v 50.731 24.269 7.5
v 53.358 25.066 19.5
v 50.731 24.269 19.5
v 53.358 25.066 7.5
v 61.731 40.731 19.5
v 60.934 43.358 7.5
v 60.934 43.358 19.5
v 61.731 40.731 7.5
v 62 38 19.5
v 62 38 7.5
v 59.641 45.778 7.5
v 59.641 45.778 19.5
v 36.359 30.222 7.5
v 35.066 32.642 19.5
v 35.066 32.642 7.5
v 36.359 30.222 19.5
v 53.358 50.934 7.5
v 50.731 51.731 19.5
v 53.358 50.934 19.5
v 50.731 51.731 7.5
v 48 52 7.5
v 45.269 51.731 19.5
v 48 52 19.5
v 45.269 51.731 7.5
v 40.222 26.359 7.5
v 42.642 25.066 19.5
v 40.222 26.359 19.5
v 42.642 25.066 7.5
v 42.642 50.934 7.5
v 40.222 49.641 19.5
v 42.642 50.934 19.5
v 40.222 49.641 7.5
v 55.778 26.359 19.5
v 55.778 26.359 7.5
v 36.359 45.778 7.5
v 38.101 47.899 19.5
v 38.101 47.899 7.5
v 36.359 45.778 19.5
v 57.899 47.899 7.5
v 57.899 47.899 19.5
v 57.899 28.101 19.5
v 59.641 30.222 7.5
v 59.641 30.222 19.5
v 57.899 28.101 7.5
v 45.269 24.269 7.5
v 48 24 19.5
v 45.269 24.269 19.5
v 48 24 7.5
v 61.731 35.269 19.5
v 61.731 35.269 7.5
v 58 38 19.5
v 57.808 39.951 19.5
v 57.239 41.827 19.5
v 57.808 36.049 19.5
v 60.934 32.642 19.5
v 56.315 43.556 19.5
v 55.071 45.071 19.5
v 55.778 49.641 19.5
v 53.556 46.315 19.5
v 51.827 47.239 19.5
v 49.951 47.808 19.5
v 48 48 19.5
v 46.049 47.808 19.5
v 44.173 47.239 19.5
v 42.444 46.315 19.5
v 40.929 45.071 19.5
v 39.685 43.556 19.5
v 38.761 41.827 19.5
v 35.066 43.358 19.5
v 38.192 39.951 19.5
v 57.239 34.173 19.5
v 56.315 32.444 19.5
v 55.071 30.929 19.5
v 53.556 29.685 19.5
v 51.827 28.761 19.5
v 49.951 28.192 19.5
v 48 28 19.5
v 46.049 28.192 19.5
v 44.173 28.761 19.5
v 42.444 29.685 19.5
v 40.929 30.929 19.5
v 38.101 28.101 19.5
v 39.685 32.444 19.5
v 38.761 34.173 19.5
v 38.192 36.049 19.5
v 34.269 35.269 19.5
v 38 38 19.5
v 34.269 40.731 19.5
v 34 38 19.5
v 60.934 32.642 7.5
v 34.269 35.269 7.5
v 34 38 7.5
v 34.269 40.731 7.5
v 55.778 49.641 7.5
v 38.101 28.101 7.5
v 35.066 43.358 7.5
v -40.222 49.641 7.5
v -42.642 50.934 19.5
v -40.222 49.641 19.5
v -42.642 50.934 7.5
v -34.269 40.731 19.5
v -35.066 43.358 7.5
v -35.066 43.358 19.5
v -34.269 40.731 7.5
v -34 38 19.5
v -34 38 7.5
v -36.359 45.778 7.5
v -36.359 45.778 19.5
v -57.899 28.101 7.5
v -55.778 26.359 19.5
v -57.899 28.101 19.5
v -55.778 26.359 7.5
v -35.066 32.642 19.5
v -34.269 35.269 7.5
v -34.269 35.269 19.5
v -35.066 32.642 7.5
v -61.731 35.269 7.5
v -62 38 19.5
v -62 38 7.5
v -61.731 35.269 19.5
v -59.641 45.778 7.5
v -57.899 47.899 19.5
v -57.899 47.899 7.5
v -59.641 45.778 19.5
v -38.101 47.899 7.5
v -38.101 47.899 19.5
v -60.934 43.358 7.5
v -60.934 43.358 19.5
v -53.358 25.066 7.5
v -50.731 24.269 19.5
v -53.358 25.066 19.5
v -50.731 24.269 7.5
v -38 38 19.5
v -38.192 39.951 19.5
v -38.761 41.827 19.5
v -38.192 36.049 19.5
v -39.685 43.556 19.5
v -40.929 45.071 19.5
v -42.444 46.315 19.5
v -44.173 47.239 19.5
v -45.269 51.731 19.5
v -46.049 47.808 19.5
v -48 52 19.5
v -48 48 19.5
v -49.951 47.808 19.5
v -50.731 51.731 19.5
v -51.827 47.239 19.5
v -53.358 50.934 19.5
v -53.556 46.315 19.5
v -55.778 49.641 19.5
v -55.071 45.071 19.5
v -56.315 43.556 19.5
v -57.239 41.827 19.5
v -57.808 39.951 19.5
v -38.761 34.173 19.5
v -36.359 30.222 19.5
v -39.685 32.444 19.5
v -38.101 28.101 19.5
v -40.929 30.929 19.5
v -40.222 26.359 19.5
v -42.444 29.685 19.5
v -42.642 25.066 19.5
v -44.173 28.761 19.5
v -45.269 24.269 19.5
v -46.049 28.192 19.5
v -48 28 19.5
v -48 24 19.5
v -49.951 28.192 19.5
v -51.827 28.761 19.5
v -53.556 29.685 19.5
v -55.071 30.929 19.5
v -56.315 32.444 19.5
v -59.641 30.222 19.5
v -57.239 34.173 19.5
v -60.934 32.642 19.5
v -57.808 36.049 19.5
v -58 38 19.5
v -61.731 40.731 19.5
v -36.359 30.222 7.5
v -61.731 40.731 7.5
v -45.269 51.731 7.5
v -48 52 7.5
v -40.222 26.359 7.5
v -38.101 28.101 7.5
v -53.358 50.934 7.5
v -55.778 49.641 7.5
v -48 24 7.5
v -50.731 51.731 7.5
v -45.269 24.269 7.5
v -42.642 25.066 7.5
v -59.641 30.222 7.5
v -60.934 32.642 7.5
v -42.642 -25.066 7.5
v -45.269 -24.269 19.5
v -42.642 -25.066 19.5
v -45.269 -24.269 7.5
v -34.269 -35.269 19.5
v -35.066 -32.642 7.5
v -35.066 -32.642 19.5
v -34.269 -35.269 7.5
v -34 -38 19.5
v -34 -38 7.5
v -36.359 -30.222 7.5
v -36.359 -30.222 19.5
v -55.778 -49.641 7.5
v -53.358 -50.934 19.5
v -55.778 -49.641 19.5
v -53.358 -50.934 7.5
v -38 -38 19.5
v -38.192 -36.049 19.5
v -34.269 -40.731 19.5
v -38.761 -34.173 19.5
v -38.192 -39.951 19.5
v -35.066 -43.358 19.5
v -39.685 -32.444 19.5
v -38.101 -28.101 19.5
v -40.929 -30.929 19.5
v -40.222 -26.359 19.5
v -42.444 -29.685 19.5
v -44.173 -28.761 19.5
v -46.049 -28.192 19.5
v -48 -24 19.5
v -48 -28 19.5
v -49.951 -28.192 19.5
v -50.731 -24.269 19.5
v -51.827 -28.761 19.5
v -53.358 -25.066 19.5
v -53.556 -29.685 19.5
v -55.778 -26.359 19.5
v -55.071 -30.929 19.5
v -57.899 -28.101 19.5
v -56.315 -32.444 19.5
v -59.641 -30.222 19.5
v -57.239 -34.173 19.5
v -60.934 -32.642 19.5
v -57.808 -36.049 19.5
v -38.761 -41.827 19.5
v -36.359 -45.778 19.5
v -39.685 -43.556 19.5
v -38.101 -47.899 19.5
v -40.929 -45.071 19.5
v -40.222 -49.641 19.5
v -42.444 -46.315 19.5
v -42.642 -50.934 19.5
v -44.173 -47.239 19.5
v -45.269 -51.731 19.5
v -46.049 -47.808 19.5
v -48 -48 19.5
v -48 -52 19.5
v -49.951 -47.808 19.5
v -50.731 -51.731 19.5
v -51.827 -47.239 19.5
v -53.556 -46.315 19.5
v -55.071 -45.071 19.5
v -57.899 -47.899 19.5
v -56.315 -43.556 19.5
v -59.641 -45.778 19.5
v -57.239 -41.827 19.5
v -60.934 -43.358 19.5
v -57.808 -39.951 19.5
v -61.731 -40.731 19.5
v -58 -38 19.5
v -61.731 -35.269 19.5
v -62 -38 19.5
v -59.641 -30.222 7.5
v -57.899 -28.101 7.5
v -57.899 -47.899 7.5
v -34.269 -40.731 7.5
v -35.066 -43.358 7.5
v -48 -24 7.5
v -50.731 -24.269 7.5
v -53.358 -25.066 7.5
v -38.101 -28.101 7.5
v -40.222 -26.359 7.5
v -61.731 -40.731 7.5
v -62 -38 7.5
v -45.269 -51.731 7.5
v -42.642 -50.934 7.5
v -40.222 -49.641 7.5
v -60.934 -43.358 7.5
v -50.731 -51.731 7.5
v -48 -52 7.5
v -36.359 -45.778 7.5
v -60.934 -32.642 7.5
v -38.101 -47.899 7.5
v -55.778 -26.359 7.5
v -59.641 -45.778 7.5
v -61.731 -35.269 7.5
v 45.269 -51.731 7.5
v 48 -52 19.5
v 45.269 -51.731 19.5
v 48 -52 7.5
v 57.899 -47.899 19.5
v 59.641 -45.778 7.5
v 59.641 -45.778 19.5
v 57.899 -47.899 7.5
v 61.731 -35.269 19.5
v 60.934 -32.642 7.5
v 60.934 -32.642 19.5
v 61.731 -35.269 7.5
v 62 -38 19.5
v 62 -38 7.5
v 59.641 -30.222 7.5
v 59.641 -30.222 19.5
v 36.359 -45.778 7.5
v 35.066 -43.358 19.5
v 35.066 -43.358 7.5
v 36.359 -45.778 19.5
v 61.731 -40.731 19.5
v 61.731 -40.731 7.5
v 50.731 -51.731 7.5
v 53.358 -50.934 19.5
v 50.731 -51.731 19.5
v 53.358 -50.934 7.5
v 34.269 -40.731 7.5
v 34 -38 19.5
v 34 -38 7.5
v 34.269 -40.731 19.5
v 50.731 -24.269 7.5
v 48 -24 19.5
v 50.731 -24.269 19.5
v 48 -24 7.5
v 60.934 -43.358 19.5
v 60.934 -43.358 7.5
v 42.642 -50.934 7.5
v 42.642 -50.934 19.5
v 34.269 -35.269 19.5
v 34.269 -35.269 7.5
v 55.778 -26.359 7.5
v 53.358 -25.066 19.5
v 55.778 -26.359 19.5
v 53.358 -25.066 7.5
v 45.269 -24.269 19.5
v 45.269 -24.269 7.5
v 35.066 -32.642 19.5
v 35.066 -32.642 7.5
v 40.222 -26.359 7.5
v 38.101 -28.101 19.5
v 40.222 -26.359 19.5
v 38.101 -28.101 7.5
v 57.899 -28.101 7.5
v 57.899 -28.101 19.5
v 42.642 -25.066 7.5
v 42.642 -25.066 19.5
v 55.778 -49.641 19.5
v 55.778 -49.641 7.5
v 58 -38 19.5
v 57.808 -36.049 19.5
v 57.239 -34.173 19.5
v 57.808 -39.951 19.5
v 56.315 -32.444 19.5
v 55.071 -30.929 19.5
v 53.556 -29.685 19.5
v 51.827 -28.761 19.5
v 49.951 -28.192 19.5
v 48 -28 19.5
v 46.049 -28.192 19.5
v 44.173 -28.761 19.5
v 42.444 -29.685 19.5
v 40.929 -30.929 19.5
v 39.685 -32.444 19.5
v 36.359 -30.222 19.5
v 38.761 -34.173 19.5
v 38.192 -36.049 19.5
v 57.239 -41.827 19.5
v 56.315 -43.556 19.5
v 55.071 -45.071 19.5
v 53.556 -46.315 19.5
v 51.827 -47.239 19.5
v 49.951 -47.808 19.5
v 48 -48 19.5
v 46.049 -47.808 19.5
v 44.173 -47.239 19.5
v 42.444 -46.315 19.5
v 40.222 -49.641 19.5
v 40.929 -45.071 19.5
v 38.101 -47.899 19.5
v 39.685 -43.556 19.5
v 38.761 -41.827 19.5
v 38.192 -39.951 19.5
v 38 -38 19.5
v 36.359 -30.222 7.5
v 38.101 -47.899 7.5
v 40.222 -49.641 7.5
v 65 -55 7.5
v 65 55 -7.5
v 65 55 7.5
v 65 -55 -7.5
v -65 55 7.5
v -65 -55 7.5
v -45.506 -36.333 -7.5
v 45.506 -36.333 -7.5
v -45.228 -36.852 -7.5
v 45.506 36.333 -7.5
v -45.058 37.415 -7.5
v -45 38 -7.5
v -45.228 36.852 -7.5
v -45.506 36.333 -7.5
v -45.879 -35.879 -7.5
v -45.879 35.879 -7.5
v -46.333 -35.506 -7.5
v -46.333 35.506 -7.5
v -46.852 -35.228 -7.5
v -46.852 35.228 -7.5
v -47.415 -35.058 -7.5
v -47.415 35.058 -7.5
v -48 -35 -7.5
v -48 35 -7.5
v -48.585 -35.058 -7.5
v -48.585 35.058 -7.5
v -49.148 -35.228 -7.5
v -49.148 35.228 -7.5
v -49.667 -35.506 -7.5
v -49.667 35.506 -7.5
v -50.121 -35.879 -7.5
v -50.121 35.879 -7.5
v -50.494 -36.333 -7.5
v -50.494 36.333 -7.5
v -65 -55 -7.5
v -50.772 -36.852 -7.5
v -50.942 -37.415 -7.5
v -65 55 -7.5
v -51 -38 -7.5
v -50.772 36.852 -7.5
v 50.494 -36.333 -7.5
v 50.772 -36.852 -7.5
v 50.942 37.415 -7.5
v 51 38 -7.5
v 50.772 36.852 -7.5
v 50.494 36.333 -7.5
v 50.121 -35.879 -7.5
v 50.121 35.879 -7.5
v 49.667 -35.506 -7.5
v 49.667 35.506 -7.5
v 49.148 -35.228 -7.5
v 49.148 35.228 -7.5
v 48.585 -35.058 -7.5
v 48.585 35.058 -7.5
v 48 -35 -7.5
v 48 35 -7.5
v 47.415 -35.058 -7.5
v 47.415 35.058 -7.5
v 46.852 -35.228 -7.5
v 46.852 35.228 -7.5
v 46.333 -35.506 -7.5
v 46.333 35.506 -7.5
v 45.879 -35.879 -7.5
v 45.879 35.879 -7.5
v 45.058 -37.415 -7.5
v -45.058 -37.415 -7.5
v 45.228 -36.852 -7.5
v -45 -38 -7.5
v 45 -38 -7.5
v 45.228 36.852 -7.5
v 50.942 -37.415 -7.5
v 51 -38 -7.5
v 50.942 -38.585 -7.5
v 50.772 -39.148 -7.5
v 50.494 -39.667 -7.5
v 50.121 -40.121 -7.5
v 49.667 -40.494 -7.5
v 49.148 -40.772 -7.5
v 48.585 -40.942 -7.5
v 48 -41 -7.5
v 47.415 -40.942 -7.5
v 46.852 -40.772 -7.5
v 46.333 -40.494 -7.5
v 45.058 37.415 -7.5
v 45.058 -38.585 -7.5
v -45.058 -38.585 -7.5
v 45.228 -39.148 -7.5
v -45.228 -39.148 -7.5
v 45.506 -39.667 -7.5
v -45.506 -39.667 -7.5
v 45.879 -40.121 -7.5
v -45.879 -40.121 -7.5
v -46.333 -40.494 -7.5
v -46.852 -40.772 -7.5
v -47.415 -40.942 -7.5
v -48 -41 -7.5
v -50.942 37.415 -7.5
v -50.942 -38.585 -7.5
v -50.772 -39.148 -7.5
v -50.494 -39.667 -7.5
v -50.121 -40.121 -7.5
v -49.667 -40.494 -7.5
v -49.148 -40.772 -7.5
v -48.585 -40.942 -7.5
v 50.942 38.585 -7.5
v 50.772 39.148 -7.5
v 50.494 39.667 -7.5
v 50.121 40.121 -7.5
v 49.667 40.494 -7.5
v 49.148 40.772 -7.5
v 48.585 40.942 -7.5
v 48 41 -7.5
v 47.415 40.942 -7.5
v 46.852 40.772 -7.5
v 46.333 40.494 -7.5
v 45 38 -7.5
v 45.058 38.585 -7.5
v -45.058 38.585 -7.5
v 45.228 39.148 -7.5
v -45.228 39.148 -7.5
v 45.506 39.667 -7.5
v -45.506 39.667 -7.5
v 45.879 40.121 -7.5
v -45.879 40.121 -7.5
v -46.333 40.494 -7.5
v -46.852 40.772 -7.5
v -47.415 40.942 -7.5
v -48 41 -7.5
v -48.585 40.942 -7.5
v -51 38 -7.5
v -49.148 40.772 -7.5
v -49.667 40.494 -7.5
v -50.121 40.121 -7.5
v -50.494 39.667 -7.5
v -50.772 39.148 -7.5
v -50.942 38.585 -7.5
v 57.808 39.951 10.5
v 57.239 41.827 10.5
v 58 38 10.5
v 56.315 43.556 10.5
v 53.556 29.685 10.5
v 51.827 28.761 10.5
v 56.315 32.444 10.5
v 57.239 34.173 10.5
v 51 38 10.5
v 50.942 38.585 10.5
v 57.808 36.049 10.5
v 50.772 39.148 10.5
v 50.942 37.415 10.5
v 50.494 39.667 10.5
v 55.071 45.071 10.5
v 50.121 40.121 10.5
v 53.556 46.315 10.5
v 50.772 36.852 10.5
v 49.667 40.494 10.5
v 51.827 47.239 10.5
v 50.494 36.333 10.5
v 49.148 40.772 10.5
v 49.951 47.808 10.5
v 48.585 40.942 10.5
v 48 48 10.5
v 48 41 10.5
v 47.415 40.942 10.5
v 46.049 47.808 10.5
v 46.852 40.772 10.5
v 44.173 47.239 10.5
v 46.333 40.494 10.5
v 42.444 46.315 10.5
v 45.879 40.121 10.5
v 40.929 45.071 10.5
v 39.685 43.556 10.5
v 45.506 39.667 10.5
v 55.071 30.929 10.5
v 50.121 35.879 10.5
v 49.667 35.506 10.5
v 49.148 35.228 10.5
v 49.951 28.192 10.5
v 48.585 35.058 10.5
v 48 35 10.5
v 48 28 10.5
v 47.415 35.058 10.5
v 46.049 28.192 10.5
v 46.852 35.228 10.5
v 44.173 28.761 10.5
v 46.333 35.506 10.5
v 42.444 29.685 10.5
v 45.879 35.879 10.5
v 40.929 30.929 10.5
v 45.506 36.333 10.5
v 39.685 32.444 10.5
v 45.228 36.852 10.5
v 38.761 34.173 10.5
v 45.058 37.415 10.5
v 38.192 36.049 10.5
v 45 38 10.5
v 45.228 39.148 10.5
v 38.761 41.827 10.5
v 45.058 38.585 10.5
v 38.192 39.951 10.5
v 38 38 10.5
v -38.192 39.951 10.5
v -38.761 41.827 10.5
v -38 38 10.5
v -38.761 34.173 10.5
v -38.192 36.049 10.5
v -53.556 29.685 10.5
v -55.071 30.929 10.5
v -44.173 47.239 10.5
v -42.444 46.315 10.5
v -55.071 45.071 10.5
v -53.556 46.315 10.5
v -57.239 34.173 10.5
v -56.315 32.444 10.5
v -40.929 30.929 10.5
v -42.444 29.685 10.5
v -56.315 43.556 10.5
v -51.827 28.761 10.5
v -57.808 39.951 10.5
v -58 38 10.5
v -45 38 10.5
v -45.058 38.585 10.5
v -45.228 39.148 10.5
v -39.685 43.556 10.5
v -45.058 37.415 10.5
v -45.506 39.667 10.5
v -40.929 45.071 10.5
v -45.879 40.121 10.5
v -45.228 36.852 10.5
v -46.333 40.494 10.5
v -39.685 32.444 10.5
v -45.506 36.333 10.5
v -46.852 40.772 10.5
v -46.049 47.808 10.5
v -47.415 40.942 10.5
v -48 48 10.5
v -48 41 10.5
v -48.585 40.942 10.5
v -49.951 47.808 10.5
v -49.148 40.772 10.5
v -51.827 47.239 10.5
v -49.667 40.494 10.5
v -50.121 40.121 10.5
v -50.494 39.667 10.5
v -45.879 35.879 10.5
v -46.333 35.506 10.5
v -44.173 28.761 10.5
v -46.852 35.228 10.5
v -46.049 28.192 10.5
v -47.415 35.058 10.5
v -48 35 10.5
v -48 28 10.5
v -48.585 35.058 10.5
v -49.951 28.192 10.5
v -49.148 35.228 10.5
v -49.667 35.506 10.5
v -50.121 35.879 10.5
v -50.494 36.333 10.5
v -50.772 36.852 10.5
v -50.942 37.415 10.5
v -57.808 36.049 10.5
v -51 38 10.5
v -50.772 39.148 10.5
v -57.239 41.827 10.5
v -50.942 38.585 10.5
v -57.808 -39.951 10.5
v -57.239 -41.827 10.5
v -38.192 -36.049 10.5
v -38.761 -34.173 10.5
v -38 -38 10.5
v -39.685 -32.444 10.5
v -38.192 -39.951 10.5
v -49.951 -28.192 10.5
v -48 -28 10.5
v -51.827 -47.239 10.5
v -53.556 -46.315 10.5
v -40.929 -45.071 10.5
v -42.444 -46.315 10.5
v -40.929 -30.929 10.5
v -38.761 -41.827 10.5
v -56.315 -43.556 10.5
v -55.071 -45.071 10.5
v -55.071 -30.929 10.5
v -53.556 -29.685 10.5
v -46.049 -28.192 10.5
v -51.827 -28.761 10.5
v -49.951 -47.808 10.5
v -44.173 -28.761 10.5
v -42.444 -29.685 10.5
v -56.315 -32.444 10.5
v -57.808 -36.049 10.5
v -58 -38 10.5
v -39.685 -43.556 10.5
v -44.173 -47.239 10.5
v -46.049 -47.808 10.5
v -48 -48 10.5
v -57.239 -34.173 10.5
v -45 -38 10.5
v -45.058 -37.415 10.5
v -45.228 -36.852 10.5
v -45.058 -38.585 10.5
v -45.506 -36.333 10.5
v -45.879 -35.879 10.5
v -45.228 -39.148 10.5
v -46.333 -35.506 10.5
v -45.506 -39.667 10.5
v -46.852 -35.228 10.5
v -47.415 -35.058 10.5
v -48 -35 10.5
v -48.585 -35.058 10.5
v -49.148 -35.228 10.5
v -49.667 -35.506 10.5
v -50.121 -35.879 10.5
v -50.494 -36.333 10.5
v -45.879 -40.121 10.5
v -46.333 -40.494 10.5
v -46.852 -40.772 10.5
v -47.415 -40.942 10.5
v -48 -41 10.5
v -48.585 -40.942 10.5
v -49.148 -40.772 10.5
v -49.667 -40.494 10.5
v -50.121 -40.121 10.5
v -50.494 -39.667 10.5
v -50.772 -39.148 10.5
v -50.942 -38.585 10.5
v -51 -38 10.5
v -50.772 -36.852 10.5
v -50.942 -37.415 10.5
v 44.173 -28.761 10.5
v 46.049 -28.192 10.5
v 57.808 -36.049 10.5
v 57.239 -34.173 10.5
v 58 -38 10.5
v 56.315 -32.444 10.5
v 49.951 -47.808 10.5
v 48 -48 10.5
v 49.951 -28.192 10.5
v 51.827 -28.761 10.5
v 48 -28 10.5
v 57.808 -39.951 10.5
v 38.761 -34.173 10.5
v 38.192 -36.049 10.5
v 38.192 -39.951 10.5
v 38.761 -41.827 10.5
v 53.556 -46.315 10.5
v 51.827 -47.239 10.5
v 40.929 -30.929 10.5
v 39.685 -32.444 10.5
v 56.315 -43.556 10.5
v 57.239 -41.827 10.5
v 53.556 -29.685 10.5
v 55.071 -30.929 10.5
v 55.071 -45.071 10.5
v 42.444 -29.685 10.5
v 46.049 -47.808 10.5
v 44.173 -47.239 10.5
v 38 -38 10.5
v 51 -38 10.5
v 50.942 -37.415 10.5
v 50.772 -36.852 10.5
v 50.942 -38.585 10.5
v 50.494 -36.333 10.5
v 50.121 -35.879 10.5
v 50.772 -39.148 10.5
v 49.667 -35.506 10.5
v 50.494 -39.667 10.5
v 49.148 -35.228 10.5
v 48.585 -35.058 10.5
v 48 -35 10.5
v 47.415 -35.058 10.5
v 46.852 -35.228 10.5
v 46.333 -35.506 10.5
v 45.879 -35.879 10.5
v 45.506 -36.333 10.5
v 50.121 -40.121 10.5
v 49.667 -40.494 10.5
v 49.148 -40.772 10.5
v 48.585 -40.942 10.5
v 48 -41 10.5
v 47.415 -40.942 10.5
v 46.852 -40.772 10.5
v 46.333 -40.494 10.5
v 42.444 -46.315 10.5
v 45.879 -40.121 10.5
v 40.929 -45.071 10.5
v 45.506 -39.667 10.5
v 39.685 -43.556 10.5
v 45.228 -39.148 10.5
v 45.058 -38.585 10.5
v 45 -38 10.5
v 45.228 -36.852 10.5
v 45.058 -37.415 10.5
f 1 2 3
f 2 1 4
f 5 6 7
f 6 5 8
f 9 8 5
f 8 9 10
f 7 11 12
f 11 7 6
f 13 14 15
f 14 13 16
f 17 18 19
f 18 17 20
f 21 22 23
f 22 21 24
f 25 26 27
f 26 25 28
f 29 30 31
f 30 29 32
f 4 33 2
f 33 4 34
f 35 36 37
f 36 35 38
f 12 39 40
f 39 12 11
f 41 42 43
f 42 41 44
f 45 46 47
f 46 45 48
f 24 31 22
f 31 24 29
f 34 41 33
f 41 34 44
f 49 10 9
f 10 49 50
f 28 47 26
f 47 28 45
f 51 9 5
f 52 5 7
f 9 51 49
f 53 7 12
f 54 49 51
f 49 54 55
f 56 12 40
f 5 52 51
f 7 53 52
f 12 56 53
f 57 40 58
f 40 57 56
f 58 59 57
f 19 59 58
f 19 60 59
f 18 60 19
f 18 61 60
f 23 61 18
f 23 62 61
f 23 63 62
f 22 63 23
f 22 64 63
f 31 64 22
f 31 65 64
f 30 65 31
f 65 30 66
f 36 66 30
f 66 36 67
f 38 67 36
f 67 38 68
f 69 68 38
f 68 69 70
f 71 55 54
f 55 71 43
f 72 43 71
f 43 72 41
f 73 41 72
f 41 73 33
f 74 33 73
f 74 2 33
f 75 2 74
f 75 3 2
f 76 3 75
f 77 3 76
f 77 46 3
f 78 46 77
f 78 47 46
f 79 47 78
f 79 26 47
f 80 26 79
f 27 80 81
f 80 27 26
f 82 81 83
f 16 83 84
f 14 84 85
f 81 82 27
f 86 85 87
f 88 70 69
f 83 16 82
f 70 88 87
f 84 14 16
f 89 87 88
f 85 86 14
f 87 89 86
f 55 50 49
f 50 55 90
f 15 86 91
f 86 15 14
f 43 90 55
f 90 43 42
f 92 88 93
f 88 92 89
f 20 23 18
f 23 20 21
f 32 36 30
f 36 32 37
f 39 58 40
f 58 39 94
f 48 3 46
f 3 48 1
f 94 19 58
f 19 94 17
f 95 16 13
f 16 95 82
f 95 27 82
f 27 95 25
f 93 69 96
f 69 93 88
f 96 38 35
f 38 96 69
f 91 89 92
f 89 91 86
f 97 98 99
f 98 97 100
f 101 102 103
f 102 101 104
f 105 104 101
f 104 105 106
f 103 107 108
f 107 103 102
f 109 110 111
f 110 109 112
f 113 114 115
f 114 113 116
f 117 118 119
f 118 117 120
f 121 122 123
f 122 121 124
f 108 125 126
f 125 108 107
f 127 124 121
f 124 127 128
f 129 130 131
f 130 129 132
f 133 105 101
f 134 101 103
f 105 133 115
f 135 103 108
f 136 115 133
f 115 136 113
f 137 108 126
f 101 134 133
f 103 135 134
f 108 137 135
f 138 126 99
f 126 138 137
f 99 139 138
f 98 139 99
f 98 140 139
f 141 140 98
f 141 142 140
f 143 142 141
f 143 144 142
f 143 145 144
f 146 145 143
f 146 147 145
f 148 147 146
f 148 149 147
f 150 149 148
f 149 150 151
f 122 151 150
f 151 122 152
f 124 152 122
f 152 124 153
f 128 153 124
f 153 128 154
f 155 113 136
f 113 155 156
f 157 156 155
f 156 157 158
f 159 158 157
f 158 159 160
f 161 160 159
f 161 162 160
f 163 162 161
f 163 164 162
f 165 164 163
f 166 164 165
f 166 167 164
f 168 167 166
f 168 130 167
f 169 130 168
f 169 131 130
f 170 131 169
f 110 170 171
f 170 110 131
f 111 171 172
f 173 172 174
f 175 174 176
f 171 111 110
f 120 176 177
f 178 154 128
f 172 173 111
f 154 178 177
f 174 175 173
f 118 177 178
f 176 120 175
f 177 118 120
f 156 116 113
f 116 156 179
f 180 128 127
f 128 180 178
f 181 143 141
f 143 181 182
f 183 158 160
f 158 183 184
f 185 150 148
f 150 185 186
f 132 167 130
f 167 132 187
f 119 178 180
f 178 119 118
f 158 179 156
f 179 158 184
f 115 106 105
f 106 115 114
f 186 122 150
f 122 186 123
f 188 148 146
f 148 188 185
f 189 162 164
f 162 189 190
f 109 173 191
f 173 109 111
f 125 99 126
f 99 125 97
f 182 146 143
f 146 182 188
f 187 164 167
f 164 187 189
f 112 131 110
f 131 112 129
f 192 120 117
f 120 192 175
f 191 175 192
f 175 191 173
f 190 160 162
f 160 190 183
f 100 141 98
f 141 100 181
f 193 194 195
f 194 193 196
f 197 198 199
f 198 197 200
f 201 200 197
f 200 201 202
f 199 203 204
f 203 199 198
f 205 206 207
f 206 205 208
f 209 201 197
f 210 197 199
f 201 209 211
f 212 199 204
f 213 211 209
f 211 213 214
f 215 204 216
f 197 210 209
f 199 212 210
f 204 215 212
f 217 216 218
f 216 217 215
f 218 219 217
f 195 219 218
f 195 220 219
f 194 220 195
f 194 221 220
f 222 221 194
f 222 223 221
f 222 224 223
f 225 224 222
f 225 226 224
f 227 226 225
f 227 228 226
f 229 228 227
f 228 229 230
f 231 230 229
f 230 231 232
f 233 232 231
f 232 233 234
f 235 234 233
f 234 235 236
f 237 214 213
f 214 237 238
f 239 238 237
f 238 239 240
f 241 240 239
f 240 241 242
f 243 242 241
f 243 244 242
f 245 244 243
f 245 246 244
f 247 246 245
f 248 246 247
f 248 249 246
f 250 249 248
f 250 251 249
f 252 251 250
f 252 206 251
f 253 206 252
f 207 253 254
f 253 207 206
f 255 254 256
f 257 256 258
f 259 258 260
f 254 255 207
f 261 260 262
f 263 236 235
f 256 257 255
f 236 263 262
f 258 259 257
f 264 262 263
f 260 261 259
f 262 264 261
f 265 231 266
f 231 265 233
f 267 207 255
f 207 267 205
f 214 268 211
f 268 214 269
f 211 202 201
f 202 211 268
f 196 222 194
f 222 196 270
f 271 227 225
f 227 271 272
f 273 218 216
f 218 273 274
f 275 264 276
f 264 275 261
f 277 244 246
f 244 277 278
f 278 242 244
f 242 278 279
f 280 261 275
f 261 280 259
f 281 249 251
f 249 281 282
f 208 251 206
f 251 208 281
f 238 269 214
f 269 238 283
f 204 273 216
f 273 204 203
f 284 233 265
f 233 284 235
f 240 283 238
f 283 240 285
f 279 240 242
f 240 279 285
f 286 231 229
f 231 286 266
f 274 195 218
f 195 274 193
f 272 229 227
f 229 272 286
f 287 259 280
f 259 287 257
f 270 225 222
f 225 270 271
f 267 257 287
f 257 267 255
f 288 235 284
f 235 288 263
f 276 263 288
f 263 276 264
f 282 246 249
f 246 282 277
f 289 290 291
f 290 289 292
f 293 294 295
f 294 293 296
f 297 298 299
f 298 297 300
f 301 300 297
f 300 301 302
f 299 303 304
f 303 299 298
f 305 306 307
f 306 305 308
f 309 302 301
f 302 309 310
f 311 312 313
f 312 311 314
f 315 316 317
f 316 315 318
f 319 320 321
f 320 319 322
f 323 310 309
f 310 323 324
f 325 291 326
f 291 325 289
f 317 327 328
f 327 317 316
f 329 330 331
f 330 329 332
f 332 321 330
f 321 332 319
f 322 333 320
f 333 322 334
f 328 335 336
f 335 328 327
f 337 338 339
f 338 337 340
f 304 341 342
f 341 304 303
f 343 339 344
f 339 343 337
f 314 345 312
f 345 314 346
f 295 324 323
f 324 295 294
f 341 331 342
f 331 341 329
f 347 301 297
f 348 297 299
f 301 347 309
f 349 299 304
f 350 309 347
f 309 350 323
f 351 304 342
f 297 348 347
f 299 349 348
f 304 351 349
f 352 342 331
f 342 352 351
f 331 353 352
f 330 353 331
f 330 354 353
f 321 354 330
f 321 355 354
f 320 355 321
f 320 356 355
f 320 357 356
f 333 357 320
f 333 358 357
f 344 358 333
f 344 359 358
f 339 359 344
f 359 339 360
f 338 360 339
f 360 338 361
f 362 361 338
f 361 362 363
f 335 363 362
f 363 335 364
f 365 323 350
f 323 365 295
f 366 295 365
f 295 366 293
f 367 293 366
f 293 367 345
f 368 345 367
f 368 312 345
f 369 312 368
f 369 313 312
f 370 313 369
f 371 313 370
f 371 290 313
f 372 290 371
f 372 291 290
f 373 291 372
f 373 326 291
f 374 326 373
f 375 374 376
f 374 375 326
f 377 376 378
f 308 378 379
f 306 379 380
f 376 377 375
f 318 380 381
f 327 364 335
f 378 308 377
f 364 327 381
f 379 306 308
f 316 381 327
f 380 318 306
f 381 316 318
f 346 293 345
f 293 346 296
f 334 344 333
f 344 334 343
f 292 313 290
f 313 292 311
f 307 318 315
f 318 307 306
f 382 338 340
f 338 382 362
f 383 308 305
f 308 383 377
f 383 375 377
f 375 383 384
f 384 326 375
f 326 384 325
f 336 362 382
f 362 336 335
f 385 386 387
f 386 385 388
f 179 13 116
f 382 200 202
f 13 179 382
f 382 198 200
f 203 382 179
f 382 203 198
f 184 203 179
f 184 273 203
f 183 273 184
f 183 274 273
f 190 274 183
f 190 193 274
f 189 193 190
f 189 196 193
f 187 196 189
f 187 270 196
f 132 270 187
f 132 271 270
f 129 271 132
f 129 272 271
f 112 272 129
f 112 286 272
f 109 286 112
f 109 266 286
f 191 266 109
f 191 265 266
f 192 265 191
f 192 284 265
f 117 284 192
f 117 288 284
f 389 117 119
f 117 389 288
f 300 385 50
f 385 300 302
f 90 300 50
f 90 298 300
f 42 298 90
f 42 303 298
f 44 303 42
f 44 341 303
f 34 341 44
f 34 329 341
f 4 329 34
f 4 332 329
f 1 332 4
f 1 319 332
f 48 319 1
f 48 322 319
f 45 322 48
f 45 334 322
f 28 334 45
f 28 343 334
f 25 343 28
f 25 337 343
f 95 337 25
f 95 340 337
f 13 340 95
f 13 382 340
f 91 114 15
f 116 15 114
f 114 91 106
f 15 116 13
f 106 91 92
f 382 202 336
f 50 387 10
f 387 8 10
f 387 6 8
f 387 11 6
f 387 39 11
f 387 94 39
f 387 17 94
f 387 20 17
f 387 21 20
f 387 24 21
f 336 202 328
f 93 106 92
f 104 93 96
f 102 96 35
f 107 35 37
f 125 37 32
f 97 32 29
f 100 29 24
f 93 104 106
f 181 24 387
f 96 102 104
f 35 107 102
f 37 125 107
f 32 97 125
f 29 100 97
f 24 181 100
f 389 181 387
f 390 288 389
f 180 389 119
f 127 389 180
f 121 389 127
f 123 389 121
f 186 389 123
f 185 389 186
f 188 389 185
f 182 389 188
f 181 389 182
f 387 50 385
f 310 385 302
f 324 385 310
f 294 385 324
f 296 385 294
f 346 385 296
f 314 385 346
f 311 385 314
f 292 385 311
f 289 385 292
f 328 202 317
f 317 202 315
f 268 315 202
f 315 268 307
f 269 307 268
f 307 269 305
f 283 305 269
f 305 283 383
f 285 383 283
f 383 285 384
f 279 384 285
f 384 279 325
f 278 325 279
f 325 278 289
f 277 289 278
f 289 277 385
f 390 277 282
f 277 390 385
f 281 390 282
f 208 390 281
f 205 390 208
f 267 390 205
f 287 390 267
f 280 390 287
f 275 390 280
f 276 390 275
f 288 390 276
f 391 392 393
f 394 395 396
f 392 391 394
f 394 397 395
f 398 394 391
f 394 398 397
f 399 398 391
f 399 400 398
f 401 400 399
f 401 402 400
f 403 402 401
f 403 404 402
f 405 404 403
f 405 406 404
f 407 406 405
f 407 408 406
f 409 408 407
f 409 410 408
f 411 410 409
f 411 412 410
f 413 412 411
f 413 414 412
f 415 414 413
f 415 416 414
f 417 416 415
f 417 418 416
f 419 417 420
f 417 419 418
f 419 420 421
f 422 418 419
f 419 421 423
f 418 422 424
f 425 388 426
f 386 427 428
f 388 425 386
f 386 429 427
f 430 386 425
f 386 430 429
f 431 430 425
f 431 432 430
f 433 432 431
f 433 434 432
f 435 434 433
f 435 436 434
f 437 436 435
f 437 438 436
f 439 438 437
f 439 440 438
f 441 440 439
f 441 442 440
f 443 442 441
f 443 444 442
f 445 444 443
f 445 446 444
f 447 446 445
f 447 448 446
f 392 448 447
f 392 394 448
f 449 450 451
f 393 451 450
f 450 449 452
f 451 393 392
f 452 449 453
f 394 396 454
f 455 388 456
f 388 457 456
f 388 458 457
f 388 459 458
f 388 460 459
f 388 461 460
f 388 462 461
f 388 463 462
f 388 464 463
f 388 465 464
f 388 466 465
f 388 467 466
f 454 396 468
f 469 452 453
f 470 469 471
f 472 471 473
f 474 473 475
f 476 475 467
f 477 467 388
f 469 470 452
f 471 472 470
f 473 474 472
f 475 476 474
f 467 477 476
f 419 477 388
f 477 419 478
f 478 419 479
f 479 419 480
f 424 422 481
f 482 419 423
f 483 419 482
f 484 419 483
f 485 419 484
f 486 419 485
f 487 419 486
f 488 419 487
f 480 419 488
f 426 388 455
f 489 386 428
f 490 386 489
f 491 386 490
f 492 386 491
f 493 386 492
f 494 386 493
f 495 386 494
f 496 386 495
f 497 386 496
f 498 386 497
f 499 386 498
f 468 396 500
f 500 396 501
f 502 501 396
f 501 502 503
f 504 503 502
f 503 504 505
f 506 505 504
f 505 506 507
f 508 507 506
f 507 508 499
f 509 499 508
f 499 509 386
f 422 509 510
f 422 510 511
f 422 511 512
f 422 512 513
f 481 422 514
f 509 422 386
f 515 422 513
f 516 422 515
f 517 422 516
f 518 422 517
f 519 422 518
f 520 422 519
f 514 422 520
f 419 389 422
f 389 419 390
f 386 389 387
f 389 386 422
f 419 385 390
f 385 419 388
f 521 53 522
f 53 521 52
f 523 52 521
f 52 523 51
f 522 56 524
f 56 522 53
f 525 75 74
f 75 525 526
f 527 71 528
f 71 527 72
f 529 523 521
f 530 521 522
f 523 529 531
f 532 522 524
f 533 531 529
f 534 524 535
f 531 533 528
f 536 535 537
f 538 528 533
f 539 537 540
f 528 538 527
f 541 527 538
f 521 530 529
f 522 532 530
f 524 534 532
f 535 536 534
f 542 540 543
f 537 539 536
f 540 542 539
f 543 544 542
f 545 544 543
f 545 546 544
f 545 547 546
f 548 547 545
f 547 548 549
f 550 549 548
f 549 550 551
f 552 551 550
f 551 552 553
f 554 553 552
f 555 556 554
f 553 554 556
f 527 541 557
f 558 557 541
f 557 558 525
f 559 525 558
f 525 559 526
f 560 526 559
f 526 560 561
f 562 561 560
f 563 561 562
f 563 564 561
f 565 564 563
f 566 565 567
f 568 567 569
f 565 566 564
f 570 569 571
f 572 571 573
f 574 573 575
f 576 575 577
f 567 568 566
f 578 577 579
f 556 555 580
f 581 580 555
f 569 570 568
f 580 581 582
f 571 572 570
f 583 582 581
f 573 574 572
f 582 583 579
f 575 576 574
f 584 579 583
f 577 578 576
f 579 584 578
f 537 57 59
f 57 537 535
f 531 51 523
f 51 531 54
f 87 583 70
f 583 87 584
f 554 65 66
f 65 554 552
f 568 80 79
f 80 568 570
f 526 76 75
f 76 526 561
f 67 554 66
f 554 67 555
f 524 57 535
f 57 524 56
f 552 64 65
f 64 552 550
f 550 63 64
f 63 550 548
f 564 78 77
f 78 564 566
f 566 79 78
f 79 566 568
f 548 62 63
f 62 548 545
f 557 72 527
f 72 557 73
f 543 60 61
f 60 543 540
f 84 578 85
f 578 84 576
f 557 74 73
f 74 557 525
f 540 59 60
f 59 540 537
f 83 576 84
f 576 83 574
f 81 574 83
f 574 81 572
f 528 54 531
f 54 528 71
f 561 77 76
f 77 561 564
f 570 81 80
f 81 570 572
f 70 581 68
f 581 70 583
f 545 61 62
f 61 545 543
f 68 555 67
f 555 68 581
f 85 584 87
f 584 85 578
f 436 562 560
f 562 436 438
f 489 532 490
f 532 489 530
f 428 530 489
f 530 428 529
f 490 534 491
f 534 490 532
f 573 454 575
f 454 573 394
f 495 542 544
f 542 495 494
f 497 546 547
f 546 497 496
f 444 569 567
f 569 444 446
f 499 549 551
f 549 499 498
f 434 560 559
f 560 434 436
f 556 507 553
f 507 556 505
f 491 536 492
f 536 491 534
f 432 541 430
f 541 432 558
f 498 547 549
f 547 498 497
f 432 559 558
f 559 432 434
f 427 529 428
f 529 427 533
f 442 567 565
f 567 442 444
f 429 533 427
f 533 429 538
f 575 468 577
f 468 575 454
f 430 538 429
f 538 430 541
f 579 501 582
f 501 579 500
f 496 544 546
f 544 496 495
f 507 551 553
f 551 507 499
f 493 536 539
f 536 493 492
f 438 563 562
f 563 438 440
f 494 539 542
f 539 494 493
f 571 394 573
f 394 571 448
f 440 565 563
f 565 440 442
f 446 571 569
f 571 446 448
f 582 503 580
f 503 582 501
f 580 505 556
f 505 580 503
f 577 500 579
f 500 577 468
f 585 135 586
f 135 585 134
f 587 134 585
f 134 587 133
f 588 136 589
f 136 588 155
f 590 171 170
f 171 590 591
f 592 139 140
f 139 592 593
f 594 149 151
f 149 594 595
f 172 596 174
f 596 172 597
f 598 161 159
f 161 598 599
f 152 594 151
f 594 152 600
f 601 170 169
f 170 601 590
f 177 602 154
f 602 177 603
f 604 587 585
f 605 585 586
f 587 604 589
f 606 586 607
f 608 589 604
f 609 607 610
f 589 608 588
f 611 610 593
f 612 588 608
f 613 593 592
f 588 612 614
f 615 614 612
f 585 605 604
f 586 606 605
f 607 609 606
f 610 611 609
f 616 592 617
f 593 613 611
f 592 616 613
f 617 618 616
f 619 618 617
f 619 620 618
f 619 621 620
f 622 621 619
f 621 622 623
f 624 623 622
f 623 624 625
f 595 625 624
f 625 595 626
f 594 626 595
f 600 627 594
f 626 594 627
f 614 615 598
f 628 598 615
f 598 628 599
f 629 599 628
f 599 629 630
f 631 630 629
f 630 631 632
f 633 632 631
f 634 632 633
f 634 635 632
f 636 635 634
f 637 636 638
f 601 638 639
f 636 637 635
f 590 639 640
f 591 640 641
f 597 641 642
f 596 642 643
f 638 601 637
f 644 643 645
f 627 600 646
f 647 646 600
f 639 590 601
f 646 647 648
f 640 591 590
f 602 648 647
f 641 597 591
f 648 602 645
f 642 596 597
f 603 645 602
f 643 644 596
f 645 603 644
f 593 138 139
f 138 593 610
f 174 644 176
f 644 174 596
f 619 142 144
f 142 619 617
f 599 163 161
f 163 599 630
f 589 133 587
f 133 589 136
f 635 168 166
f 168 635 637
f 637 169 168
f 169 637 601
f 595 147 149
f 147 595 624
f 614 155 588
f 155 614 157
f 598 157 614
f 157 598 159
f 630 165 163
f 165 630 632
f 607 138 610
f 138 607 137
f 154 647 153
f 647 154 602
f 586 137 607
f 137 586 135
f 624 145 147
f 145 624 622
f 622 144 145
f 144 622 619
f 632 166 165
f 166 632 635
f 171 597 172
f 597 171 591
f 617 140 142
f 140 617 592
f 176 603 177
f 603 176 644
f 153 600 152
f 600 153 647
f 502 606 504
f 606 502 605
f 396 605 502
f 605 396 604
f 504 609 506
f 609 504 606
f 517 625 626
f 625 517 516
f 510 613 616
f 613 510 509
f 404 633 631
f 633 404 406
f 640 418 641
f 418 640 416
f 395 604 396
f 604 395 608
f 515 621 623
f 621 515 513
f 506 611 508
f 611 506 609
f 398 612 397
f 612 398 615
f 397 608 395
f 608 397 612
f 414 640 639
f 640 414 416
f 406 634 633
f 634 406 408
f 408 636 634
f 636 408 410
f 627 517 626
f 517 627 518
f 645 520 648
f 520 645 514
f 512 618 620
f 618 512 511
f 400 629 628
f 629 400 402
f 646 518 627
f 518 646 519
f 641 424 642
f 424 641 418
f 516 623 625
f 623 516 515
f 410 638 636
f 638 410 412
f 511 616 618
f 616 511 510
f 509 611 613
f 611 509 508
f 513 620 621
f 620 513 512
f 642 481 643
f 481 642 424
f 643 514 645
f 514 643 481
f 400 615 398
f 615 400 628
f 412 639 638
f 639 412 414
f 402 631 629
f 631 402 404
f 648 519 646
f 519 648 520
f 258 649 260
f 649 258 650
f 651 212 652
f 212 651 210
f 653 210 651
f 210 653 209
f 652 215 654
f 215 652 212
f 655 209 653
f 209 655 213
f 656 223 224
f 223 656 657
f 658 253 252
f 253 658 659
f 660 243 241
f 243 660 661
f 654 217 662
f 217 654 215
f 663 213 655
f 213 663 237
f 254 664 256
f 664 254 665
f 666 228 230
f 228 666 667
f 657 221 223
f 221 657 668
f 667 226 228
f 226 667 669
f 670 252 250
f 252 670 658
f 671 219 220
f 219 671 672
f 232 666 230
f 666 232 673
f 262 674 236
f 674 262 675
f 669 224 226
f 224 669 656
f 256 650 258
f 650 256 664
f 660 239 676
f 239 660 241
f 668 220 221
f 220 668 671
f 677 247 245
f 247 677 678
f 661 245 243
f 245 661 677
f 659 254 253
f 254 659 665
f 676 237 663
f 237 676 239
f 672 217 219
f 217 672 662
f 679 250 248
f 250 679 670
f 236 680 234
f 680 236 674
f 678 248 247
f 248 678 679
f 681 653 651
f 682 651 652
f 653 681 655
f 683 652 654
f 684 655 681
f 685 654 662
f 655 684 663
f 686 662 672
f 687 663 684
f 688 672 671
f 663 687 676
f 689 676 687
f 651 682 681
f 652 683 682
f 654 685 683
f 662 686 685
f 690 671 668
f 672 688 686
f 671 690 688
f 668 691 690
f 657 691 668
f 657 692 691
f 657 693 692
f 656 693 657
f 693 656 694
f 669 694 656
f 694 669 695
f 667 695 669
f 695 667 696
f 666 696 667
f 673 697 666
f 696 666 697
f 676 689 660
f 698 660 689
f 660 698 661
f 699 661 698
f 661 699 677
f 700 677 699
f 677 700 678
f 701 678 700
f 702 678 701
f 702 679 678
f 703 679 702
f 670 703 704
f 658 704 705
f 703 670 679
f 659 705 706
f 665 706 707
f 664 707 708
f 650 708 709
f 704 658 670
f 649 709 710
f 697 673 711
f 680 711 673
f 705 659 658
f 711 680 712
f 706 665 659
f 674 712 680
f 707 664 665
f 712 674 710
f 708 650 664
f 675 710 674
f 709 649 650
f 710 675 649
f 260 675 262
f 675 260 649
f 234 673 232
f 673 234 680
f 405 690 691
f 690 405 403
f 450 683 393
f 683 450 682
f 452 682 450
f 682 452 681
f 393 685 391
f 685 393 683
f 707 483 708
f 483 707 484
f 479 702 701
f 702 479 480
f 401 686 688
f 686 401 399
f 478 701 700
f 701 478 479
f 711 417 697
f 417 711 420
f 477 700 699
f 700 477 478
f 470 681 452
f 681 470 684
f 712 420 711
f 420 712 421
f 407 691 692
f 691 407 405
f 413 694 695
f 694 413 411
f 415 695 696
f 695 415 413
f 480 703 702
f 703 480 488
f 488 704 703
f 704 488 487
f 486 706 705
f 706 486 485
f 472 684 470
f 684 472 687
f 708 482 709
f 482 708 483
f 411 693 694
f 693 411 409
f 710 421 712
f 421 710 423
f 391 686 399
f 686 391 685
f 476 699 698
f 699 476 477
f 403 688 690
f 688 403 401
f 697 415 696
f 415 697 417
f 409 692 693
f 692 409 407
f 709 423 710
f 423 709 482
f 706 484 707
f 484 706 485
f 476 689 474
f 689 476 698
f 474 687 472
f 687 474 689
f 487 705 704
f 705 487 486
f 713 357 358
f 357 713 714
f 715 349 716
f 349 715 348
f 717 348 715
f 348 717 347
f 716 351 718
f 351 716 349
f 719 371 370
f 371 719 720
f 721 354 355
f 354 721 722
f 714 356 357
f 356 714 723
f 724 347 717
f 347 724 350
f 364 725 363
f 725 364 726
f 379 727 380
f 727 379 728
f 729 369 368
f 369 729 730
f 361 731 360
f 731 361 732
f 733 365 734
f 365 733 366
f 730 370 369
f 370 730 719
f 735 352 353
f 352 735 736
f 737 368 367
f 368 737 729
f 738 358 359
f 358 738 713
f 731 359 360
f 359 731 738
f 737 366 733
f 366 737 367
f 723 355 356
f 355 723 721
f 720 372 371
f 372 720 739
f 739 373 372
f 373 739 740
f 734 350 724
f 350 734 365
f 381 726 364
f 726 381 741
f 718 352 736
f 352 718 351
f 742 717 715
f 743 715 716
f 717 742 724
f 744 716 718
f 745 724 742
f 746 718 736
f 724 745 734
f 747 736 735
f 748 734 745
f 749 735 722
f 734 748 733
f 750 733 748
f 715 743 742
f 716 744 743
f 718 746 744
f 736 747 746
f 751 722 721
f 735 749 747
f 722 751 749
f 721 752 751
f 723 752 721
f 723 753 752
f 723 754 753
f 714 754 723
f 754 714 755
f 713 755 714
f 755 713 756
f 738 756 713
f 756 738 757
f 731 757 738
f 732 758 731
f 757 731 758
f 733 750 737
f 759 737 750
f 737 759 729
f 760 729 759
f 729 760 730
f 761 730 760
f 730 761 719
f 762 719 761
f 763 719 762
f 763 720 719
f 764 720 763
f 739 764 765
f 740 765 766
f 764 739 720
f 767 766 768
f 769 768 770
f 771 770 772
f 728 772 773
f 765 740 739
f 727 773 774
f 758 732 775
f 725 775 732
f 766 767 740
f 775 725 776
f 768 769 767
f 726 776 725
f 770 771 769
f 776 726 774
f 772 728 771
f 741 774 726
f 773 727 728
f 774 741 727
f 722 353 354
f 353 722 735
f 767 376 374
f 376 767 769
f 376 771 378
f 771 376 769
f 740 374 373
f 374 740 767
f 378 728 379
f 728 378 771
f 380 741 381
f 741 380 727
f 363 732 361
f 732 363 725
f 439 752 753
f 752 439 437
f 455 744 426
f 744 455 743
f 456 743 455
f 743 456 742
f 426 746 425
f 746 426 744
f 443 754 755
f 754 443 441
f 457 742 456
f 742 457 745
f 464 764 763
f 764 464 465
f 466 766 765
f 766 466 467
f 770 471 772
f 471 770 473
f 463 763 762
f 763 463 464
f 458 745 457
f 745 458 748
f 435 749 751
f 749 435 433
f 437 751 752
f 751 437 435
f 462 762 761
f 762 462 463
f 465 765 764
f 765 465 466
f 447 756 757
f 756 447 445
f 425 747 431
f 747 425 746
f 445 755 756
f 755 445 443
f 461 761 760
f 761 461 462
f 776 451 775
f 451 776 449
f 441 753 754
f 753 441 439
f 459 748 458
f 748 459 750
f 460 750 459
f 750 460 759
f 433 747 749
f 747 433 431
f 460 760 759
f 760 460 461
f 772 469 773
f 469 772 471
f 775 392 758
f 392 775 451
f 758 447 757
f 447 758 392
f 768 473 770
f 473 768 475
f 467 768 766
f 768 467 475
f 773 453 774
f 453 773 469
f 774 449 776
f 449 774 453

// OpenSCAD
$fn = 32;

// ----------------------------------------------------------------------
// Socket pad plate
// bosses with counterbored sockets for the screws
// ----------------------------------------------------------------------

// --- parameters (mm) ---
base_t = 15;             // base plate thickness
boss_h = 12;             // boss height above the base plate
boss_d = 28;             // boss diameter
socket_d = 20;           // socket diameter
socket_depth = 9;        // socket depth from the boss face
bolt_d = 6;              // screw clearance hole through the socket floor
plate = [130, 110, 15];  // overall size (x, y, z)
edge = 17;               // boss centre offset from the plate edge
pads = 4;                // boss count, one per corner

// --- derived feature positions (mm) ---
height = base_t + boss_h;        // = 27   overall height of the part
corner_x = plate[0] / 2 - edge;  // = 48   boss centre X
corner_y = plate[1] / 2 - edge;  // = 38   boss centre Y
feature_centers = [
  [corner_x, corner_y],
  [-corner_x, corner_y],
  [-corner_x, -corner_y],
  [corner_x, -corner_y]
];   // boss centres: sockets, holes and the pads themselves are placed from here

// base plate, bosses on feature_centers, socket + through hole in each
difference() {
  union() {
    cube(plate, center = true);
    for (centre = feature_centers)
      translate([centre[0], centre[1], plate[2] / 2 - 1])
        cylinder(d = boss_d, h = boss_h + 1);
  }
  for (centre = feature_centers) {
    translate([centre[0], centre[1], plate[2] / 2 + boss_h - socket_depth])
      cylinder(d = socket_d, h = socket_depth + 1);
    translate([centre[0], centre[1], -height])
      cylinder(d = bolt_d, h = 2 * height + 2);  // through the socket floor
  }
}
